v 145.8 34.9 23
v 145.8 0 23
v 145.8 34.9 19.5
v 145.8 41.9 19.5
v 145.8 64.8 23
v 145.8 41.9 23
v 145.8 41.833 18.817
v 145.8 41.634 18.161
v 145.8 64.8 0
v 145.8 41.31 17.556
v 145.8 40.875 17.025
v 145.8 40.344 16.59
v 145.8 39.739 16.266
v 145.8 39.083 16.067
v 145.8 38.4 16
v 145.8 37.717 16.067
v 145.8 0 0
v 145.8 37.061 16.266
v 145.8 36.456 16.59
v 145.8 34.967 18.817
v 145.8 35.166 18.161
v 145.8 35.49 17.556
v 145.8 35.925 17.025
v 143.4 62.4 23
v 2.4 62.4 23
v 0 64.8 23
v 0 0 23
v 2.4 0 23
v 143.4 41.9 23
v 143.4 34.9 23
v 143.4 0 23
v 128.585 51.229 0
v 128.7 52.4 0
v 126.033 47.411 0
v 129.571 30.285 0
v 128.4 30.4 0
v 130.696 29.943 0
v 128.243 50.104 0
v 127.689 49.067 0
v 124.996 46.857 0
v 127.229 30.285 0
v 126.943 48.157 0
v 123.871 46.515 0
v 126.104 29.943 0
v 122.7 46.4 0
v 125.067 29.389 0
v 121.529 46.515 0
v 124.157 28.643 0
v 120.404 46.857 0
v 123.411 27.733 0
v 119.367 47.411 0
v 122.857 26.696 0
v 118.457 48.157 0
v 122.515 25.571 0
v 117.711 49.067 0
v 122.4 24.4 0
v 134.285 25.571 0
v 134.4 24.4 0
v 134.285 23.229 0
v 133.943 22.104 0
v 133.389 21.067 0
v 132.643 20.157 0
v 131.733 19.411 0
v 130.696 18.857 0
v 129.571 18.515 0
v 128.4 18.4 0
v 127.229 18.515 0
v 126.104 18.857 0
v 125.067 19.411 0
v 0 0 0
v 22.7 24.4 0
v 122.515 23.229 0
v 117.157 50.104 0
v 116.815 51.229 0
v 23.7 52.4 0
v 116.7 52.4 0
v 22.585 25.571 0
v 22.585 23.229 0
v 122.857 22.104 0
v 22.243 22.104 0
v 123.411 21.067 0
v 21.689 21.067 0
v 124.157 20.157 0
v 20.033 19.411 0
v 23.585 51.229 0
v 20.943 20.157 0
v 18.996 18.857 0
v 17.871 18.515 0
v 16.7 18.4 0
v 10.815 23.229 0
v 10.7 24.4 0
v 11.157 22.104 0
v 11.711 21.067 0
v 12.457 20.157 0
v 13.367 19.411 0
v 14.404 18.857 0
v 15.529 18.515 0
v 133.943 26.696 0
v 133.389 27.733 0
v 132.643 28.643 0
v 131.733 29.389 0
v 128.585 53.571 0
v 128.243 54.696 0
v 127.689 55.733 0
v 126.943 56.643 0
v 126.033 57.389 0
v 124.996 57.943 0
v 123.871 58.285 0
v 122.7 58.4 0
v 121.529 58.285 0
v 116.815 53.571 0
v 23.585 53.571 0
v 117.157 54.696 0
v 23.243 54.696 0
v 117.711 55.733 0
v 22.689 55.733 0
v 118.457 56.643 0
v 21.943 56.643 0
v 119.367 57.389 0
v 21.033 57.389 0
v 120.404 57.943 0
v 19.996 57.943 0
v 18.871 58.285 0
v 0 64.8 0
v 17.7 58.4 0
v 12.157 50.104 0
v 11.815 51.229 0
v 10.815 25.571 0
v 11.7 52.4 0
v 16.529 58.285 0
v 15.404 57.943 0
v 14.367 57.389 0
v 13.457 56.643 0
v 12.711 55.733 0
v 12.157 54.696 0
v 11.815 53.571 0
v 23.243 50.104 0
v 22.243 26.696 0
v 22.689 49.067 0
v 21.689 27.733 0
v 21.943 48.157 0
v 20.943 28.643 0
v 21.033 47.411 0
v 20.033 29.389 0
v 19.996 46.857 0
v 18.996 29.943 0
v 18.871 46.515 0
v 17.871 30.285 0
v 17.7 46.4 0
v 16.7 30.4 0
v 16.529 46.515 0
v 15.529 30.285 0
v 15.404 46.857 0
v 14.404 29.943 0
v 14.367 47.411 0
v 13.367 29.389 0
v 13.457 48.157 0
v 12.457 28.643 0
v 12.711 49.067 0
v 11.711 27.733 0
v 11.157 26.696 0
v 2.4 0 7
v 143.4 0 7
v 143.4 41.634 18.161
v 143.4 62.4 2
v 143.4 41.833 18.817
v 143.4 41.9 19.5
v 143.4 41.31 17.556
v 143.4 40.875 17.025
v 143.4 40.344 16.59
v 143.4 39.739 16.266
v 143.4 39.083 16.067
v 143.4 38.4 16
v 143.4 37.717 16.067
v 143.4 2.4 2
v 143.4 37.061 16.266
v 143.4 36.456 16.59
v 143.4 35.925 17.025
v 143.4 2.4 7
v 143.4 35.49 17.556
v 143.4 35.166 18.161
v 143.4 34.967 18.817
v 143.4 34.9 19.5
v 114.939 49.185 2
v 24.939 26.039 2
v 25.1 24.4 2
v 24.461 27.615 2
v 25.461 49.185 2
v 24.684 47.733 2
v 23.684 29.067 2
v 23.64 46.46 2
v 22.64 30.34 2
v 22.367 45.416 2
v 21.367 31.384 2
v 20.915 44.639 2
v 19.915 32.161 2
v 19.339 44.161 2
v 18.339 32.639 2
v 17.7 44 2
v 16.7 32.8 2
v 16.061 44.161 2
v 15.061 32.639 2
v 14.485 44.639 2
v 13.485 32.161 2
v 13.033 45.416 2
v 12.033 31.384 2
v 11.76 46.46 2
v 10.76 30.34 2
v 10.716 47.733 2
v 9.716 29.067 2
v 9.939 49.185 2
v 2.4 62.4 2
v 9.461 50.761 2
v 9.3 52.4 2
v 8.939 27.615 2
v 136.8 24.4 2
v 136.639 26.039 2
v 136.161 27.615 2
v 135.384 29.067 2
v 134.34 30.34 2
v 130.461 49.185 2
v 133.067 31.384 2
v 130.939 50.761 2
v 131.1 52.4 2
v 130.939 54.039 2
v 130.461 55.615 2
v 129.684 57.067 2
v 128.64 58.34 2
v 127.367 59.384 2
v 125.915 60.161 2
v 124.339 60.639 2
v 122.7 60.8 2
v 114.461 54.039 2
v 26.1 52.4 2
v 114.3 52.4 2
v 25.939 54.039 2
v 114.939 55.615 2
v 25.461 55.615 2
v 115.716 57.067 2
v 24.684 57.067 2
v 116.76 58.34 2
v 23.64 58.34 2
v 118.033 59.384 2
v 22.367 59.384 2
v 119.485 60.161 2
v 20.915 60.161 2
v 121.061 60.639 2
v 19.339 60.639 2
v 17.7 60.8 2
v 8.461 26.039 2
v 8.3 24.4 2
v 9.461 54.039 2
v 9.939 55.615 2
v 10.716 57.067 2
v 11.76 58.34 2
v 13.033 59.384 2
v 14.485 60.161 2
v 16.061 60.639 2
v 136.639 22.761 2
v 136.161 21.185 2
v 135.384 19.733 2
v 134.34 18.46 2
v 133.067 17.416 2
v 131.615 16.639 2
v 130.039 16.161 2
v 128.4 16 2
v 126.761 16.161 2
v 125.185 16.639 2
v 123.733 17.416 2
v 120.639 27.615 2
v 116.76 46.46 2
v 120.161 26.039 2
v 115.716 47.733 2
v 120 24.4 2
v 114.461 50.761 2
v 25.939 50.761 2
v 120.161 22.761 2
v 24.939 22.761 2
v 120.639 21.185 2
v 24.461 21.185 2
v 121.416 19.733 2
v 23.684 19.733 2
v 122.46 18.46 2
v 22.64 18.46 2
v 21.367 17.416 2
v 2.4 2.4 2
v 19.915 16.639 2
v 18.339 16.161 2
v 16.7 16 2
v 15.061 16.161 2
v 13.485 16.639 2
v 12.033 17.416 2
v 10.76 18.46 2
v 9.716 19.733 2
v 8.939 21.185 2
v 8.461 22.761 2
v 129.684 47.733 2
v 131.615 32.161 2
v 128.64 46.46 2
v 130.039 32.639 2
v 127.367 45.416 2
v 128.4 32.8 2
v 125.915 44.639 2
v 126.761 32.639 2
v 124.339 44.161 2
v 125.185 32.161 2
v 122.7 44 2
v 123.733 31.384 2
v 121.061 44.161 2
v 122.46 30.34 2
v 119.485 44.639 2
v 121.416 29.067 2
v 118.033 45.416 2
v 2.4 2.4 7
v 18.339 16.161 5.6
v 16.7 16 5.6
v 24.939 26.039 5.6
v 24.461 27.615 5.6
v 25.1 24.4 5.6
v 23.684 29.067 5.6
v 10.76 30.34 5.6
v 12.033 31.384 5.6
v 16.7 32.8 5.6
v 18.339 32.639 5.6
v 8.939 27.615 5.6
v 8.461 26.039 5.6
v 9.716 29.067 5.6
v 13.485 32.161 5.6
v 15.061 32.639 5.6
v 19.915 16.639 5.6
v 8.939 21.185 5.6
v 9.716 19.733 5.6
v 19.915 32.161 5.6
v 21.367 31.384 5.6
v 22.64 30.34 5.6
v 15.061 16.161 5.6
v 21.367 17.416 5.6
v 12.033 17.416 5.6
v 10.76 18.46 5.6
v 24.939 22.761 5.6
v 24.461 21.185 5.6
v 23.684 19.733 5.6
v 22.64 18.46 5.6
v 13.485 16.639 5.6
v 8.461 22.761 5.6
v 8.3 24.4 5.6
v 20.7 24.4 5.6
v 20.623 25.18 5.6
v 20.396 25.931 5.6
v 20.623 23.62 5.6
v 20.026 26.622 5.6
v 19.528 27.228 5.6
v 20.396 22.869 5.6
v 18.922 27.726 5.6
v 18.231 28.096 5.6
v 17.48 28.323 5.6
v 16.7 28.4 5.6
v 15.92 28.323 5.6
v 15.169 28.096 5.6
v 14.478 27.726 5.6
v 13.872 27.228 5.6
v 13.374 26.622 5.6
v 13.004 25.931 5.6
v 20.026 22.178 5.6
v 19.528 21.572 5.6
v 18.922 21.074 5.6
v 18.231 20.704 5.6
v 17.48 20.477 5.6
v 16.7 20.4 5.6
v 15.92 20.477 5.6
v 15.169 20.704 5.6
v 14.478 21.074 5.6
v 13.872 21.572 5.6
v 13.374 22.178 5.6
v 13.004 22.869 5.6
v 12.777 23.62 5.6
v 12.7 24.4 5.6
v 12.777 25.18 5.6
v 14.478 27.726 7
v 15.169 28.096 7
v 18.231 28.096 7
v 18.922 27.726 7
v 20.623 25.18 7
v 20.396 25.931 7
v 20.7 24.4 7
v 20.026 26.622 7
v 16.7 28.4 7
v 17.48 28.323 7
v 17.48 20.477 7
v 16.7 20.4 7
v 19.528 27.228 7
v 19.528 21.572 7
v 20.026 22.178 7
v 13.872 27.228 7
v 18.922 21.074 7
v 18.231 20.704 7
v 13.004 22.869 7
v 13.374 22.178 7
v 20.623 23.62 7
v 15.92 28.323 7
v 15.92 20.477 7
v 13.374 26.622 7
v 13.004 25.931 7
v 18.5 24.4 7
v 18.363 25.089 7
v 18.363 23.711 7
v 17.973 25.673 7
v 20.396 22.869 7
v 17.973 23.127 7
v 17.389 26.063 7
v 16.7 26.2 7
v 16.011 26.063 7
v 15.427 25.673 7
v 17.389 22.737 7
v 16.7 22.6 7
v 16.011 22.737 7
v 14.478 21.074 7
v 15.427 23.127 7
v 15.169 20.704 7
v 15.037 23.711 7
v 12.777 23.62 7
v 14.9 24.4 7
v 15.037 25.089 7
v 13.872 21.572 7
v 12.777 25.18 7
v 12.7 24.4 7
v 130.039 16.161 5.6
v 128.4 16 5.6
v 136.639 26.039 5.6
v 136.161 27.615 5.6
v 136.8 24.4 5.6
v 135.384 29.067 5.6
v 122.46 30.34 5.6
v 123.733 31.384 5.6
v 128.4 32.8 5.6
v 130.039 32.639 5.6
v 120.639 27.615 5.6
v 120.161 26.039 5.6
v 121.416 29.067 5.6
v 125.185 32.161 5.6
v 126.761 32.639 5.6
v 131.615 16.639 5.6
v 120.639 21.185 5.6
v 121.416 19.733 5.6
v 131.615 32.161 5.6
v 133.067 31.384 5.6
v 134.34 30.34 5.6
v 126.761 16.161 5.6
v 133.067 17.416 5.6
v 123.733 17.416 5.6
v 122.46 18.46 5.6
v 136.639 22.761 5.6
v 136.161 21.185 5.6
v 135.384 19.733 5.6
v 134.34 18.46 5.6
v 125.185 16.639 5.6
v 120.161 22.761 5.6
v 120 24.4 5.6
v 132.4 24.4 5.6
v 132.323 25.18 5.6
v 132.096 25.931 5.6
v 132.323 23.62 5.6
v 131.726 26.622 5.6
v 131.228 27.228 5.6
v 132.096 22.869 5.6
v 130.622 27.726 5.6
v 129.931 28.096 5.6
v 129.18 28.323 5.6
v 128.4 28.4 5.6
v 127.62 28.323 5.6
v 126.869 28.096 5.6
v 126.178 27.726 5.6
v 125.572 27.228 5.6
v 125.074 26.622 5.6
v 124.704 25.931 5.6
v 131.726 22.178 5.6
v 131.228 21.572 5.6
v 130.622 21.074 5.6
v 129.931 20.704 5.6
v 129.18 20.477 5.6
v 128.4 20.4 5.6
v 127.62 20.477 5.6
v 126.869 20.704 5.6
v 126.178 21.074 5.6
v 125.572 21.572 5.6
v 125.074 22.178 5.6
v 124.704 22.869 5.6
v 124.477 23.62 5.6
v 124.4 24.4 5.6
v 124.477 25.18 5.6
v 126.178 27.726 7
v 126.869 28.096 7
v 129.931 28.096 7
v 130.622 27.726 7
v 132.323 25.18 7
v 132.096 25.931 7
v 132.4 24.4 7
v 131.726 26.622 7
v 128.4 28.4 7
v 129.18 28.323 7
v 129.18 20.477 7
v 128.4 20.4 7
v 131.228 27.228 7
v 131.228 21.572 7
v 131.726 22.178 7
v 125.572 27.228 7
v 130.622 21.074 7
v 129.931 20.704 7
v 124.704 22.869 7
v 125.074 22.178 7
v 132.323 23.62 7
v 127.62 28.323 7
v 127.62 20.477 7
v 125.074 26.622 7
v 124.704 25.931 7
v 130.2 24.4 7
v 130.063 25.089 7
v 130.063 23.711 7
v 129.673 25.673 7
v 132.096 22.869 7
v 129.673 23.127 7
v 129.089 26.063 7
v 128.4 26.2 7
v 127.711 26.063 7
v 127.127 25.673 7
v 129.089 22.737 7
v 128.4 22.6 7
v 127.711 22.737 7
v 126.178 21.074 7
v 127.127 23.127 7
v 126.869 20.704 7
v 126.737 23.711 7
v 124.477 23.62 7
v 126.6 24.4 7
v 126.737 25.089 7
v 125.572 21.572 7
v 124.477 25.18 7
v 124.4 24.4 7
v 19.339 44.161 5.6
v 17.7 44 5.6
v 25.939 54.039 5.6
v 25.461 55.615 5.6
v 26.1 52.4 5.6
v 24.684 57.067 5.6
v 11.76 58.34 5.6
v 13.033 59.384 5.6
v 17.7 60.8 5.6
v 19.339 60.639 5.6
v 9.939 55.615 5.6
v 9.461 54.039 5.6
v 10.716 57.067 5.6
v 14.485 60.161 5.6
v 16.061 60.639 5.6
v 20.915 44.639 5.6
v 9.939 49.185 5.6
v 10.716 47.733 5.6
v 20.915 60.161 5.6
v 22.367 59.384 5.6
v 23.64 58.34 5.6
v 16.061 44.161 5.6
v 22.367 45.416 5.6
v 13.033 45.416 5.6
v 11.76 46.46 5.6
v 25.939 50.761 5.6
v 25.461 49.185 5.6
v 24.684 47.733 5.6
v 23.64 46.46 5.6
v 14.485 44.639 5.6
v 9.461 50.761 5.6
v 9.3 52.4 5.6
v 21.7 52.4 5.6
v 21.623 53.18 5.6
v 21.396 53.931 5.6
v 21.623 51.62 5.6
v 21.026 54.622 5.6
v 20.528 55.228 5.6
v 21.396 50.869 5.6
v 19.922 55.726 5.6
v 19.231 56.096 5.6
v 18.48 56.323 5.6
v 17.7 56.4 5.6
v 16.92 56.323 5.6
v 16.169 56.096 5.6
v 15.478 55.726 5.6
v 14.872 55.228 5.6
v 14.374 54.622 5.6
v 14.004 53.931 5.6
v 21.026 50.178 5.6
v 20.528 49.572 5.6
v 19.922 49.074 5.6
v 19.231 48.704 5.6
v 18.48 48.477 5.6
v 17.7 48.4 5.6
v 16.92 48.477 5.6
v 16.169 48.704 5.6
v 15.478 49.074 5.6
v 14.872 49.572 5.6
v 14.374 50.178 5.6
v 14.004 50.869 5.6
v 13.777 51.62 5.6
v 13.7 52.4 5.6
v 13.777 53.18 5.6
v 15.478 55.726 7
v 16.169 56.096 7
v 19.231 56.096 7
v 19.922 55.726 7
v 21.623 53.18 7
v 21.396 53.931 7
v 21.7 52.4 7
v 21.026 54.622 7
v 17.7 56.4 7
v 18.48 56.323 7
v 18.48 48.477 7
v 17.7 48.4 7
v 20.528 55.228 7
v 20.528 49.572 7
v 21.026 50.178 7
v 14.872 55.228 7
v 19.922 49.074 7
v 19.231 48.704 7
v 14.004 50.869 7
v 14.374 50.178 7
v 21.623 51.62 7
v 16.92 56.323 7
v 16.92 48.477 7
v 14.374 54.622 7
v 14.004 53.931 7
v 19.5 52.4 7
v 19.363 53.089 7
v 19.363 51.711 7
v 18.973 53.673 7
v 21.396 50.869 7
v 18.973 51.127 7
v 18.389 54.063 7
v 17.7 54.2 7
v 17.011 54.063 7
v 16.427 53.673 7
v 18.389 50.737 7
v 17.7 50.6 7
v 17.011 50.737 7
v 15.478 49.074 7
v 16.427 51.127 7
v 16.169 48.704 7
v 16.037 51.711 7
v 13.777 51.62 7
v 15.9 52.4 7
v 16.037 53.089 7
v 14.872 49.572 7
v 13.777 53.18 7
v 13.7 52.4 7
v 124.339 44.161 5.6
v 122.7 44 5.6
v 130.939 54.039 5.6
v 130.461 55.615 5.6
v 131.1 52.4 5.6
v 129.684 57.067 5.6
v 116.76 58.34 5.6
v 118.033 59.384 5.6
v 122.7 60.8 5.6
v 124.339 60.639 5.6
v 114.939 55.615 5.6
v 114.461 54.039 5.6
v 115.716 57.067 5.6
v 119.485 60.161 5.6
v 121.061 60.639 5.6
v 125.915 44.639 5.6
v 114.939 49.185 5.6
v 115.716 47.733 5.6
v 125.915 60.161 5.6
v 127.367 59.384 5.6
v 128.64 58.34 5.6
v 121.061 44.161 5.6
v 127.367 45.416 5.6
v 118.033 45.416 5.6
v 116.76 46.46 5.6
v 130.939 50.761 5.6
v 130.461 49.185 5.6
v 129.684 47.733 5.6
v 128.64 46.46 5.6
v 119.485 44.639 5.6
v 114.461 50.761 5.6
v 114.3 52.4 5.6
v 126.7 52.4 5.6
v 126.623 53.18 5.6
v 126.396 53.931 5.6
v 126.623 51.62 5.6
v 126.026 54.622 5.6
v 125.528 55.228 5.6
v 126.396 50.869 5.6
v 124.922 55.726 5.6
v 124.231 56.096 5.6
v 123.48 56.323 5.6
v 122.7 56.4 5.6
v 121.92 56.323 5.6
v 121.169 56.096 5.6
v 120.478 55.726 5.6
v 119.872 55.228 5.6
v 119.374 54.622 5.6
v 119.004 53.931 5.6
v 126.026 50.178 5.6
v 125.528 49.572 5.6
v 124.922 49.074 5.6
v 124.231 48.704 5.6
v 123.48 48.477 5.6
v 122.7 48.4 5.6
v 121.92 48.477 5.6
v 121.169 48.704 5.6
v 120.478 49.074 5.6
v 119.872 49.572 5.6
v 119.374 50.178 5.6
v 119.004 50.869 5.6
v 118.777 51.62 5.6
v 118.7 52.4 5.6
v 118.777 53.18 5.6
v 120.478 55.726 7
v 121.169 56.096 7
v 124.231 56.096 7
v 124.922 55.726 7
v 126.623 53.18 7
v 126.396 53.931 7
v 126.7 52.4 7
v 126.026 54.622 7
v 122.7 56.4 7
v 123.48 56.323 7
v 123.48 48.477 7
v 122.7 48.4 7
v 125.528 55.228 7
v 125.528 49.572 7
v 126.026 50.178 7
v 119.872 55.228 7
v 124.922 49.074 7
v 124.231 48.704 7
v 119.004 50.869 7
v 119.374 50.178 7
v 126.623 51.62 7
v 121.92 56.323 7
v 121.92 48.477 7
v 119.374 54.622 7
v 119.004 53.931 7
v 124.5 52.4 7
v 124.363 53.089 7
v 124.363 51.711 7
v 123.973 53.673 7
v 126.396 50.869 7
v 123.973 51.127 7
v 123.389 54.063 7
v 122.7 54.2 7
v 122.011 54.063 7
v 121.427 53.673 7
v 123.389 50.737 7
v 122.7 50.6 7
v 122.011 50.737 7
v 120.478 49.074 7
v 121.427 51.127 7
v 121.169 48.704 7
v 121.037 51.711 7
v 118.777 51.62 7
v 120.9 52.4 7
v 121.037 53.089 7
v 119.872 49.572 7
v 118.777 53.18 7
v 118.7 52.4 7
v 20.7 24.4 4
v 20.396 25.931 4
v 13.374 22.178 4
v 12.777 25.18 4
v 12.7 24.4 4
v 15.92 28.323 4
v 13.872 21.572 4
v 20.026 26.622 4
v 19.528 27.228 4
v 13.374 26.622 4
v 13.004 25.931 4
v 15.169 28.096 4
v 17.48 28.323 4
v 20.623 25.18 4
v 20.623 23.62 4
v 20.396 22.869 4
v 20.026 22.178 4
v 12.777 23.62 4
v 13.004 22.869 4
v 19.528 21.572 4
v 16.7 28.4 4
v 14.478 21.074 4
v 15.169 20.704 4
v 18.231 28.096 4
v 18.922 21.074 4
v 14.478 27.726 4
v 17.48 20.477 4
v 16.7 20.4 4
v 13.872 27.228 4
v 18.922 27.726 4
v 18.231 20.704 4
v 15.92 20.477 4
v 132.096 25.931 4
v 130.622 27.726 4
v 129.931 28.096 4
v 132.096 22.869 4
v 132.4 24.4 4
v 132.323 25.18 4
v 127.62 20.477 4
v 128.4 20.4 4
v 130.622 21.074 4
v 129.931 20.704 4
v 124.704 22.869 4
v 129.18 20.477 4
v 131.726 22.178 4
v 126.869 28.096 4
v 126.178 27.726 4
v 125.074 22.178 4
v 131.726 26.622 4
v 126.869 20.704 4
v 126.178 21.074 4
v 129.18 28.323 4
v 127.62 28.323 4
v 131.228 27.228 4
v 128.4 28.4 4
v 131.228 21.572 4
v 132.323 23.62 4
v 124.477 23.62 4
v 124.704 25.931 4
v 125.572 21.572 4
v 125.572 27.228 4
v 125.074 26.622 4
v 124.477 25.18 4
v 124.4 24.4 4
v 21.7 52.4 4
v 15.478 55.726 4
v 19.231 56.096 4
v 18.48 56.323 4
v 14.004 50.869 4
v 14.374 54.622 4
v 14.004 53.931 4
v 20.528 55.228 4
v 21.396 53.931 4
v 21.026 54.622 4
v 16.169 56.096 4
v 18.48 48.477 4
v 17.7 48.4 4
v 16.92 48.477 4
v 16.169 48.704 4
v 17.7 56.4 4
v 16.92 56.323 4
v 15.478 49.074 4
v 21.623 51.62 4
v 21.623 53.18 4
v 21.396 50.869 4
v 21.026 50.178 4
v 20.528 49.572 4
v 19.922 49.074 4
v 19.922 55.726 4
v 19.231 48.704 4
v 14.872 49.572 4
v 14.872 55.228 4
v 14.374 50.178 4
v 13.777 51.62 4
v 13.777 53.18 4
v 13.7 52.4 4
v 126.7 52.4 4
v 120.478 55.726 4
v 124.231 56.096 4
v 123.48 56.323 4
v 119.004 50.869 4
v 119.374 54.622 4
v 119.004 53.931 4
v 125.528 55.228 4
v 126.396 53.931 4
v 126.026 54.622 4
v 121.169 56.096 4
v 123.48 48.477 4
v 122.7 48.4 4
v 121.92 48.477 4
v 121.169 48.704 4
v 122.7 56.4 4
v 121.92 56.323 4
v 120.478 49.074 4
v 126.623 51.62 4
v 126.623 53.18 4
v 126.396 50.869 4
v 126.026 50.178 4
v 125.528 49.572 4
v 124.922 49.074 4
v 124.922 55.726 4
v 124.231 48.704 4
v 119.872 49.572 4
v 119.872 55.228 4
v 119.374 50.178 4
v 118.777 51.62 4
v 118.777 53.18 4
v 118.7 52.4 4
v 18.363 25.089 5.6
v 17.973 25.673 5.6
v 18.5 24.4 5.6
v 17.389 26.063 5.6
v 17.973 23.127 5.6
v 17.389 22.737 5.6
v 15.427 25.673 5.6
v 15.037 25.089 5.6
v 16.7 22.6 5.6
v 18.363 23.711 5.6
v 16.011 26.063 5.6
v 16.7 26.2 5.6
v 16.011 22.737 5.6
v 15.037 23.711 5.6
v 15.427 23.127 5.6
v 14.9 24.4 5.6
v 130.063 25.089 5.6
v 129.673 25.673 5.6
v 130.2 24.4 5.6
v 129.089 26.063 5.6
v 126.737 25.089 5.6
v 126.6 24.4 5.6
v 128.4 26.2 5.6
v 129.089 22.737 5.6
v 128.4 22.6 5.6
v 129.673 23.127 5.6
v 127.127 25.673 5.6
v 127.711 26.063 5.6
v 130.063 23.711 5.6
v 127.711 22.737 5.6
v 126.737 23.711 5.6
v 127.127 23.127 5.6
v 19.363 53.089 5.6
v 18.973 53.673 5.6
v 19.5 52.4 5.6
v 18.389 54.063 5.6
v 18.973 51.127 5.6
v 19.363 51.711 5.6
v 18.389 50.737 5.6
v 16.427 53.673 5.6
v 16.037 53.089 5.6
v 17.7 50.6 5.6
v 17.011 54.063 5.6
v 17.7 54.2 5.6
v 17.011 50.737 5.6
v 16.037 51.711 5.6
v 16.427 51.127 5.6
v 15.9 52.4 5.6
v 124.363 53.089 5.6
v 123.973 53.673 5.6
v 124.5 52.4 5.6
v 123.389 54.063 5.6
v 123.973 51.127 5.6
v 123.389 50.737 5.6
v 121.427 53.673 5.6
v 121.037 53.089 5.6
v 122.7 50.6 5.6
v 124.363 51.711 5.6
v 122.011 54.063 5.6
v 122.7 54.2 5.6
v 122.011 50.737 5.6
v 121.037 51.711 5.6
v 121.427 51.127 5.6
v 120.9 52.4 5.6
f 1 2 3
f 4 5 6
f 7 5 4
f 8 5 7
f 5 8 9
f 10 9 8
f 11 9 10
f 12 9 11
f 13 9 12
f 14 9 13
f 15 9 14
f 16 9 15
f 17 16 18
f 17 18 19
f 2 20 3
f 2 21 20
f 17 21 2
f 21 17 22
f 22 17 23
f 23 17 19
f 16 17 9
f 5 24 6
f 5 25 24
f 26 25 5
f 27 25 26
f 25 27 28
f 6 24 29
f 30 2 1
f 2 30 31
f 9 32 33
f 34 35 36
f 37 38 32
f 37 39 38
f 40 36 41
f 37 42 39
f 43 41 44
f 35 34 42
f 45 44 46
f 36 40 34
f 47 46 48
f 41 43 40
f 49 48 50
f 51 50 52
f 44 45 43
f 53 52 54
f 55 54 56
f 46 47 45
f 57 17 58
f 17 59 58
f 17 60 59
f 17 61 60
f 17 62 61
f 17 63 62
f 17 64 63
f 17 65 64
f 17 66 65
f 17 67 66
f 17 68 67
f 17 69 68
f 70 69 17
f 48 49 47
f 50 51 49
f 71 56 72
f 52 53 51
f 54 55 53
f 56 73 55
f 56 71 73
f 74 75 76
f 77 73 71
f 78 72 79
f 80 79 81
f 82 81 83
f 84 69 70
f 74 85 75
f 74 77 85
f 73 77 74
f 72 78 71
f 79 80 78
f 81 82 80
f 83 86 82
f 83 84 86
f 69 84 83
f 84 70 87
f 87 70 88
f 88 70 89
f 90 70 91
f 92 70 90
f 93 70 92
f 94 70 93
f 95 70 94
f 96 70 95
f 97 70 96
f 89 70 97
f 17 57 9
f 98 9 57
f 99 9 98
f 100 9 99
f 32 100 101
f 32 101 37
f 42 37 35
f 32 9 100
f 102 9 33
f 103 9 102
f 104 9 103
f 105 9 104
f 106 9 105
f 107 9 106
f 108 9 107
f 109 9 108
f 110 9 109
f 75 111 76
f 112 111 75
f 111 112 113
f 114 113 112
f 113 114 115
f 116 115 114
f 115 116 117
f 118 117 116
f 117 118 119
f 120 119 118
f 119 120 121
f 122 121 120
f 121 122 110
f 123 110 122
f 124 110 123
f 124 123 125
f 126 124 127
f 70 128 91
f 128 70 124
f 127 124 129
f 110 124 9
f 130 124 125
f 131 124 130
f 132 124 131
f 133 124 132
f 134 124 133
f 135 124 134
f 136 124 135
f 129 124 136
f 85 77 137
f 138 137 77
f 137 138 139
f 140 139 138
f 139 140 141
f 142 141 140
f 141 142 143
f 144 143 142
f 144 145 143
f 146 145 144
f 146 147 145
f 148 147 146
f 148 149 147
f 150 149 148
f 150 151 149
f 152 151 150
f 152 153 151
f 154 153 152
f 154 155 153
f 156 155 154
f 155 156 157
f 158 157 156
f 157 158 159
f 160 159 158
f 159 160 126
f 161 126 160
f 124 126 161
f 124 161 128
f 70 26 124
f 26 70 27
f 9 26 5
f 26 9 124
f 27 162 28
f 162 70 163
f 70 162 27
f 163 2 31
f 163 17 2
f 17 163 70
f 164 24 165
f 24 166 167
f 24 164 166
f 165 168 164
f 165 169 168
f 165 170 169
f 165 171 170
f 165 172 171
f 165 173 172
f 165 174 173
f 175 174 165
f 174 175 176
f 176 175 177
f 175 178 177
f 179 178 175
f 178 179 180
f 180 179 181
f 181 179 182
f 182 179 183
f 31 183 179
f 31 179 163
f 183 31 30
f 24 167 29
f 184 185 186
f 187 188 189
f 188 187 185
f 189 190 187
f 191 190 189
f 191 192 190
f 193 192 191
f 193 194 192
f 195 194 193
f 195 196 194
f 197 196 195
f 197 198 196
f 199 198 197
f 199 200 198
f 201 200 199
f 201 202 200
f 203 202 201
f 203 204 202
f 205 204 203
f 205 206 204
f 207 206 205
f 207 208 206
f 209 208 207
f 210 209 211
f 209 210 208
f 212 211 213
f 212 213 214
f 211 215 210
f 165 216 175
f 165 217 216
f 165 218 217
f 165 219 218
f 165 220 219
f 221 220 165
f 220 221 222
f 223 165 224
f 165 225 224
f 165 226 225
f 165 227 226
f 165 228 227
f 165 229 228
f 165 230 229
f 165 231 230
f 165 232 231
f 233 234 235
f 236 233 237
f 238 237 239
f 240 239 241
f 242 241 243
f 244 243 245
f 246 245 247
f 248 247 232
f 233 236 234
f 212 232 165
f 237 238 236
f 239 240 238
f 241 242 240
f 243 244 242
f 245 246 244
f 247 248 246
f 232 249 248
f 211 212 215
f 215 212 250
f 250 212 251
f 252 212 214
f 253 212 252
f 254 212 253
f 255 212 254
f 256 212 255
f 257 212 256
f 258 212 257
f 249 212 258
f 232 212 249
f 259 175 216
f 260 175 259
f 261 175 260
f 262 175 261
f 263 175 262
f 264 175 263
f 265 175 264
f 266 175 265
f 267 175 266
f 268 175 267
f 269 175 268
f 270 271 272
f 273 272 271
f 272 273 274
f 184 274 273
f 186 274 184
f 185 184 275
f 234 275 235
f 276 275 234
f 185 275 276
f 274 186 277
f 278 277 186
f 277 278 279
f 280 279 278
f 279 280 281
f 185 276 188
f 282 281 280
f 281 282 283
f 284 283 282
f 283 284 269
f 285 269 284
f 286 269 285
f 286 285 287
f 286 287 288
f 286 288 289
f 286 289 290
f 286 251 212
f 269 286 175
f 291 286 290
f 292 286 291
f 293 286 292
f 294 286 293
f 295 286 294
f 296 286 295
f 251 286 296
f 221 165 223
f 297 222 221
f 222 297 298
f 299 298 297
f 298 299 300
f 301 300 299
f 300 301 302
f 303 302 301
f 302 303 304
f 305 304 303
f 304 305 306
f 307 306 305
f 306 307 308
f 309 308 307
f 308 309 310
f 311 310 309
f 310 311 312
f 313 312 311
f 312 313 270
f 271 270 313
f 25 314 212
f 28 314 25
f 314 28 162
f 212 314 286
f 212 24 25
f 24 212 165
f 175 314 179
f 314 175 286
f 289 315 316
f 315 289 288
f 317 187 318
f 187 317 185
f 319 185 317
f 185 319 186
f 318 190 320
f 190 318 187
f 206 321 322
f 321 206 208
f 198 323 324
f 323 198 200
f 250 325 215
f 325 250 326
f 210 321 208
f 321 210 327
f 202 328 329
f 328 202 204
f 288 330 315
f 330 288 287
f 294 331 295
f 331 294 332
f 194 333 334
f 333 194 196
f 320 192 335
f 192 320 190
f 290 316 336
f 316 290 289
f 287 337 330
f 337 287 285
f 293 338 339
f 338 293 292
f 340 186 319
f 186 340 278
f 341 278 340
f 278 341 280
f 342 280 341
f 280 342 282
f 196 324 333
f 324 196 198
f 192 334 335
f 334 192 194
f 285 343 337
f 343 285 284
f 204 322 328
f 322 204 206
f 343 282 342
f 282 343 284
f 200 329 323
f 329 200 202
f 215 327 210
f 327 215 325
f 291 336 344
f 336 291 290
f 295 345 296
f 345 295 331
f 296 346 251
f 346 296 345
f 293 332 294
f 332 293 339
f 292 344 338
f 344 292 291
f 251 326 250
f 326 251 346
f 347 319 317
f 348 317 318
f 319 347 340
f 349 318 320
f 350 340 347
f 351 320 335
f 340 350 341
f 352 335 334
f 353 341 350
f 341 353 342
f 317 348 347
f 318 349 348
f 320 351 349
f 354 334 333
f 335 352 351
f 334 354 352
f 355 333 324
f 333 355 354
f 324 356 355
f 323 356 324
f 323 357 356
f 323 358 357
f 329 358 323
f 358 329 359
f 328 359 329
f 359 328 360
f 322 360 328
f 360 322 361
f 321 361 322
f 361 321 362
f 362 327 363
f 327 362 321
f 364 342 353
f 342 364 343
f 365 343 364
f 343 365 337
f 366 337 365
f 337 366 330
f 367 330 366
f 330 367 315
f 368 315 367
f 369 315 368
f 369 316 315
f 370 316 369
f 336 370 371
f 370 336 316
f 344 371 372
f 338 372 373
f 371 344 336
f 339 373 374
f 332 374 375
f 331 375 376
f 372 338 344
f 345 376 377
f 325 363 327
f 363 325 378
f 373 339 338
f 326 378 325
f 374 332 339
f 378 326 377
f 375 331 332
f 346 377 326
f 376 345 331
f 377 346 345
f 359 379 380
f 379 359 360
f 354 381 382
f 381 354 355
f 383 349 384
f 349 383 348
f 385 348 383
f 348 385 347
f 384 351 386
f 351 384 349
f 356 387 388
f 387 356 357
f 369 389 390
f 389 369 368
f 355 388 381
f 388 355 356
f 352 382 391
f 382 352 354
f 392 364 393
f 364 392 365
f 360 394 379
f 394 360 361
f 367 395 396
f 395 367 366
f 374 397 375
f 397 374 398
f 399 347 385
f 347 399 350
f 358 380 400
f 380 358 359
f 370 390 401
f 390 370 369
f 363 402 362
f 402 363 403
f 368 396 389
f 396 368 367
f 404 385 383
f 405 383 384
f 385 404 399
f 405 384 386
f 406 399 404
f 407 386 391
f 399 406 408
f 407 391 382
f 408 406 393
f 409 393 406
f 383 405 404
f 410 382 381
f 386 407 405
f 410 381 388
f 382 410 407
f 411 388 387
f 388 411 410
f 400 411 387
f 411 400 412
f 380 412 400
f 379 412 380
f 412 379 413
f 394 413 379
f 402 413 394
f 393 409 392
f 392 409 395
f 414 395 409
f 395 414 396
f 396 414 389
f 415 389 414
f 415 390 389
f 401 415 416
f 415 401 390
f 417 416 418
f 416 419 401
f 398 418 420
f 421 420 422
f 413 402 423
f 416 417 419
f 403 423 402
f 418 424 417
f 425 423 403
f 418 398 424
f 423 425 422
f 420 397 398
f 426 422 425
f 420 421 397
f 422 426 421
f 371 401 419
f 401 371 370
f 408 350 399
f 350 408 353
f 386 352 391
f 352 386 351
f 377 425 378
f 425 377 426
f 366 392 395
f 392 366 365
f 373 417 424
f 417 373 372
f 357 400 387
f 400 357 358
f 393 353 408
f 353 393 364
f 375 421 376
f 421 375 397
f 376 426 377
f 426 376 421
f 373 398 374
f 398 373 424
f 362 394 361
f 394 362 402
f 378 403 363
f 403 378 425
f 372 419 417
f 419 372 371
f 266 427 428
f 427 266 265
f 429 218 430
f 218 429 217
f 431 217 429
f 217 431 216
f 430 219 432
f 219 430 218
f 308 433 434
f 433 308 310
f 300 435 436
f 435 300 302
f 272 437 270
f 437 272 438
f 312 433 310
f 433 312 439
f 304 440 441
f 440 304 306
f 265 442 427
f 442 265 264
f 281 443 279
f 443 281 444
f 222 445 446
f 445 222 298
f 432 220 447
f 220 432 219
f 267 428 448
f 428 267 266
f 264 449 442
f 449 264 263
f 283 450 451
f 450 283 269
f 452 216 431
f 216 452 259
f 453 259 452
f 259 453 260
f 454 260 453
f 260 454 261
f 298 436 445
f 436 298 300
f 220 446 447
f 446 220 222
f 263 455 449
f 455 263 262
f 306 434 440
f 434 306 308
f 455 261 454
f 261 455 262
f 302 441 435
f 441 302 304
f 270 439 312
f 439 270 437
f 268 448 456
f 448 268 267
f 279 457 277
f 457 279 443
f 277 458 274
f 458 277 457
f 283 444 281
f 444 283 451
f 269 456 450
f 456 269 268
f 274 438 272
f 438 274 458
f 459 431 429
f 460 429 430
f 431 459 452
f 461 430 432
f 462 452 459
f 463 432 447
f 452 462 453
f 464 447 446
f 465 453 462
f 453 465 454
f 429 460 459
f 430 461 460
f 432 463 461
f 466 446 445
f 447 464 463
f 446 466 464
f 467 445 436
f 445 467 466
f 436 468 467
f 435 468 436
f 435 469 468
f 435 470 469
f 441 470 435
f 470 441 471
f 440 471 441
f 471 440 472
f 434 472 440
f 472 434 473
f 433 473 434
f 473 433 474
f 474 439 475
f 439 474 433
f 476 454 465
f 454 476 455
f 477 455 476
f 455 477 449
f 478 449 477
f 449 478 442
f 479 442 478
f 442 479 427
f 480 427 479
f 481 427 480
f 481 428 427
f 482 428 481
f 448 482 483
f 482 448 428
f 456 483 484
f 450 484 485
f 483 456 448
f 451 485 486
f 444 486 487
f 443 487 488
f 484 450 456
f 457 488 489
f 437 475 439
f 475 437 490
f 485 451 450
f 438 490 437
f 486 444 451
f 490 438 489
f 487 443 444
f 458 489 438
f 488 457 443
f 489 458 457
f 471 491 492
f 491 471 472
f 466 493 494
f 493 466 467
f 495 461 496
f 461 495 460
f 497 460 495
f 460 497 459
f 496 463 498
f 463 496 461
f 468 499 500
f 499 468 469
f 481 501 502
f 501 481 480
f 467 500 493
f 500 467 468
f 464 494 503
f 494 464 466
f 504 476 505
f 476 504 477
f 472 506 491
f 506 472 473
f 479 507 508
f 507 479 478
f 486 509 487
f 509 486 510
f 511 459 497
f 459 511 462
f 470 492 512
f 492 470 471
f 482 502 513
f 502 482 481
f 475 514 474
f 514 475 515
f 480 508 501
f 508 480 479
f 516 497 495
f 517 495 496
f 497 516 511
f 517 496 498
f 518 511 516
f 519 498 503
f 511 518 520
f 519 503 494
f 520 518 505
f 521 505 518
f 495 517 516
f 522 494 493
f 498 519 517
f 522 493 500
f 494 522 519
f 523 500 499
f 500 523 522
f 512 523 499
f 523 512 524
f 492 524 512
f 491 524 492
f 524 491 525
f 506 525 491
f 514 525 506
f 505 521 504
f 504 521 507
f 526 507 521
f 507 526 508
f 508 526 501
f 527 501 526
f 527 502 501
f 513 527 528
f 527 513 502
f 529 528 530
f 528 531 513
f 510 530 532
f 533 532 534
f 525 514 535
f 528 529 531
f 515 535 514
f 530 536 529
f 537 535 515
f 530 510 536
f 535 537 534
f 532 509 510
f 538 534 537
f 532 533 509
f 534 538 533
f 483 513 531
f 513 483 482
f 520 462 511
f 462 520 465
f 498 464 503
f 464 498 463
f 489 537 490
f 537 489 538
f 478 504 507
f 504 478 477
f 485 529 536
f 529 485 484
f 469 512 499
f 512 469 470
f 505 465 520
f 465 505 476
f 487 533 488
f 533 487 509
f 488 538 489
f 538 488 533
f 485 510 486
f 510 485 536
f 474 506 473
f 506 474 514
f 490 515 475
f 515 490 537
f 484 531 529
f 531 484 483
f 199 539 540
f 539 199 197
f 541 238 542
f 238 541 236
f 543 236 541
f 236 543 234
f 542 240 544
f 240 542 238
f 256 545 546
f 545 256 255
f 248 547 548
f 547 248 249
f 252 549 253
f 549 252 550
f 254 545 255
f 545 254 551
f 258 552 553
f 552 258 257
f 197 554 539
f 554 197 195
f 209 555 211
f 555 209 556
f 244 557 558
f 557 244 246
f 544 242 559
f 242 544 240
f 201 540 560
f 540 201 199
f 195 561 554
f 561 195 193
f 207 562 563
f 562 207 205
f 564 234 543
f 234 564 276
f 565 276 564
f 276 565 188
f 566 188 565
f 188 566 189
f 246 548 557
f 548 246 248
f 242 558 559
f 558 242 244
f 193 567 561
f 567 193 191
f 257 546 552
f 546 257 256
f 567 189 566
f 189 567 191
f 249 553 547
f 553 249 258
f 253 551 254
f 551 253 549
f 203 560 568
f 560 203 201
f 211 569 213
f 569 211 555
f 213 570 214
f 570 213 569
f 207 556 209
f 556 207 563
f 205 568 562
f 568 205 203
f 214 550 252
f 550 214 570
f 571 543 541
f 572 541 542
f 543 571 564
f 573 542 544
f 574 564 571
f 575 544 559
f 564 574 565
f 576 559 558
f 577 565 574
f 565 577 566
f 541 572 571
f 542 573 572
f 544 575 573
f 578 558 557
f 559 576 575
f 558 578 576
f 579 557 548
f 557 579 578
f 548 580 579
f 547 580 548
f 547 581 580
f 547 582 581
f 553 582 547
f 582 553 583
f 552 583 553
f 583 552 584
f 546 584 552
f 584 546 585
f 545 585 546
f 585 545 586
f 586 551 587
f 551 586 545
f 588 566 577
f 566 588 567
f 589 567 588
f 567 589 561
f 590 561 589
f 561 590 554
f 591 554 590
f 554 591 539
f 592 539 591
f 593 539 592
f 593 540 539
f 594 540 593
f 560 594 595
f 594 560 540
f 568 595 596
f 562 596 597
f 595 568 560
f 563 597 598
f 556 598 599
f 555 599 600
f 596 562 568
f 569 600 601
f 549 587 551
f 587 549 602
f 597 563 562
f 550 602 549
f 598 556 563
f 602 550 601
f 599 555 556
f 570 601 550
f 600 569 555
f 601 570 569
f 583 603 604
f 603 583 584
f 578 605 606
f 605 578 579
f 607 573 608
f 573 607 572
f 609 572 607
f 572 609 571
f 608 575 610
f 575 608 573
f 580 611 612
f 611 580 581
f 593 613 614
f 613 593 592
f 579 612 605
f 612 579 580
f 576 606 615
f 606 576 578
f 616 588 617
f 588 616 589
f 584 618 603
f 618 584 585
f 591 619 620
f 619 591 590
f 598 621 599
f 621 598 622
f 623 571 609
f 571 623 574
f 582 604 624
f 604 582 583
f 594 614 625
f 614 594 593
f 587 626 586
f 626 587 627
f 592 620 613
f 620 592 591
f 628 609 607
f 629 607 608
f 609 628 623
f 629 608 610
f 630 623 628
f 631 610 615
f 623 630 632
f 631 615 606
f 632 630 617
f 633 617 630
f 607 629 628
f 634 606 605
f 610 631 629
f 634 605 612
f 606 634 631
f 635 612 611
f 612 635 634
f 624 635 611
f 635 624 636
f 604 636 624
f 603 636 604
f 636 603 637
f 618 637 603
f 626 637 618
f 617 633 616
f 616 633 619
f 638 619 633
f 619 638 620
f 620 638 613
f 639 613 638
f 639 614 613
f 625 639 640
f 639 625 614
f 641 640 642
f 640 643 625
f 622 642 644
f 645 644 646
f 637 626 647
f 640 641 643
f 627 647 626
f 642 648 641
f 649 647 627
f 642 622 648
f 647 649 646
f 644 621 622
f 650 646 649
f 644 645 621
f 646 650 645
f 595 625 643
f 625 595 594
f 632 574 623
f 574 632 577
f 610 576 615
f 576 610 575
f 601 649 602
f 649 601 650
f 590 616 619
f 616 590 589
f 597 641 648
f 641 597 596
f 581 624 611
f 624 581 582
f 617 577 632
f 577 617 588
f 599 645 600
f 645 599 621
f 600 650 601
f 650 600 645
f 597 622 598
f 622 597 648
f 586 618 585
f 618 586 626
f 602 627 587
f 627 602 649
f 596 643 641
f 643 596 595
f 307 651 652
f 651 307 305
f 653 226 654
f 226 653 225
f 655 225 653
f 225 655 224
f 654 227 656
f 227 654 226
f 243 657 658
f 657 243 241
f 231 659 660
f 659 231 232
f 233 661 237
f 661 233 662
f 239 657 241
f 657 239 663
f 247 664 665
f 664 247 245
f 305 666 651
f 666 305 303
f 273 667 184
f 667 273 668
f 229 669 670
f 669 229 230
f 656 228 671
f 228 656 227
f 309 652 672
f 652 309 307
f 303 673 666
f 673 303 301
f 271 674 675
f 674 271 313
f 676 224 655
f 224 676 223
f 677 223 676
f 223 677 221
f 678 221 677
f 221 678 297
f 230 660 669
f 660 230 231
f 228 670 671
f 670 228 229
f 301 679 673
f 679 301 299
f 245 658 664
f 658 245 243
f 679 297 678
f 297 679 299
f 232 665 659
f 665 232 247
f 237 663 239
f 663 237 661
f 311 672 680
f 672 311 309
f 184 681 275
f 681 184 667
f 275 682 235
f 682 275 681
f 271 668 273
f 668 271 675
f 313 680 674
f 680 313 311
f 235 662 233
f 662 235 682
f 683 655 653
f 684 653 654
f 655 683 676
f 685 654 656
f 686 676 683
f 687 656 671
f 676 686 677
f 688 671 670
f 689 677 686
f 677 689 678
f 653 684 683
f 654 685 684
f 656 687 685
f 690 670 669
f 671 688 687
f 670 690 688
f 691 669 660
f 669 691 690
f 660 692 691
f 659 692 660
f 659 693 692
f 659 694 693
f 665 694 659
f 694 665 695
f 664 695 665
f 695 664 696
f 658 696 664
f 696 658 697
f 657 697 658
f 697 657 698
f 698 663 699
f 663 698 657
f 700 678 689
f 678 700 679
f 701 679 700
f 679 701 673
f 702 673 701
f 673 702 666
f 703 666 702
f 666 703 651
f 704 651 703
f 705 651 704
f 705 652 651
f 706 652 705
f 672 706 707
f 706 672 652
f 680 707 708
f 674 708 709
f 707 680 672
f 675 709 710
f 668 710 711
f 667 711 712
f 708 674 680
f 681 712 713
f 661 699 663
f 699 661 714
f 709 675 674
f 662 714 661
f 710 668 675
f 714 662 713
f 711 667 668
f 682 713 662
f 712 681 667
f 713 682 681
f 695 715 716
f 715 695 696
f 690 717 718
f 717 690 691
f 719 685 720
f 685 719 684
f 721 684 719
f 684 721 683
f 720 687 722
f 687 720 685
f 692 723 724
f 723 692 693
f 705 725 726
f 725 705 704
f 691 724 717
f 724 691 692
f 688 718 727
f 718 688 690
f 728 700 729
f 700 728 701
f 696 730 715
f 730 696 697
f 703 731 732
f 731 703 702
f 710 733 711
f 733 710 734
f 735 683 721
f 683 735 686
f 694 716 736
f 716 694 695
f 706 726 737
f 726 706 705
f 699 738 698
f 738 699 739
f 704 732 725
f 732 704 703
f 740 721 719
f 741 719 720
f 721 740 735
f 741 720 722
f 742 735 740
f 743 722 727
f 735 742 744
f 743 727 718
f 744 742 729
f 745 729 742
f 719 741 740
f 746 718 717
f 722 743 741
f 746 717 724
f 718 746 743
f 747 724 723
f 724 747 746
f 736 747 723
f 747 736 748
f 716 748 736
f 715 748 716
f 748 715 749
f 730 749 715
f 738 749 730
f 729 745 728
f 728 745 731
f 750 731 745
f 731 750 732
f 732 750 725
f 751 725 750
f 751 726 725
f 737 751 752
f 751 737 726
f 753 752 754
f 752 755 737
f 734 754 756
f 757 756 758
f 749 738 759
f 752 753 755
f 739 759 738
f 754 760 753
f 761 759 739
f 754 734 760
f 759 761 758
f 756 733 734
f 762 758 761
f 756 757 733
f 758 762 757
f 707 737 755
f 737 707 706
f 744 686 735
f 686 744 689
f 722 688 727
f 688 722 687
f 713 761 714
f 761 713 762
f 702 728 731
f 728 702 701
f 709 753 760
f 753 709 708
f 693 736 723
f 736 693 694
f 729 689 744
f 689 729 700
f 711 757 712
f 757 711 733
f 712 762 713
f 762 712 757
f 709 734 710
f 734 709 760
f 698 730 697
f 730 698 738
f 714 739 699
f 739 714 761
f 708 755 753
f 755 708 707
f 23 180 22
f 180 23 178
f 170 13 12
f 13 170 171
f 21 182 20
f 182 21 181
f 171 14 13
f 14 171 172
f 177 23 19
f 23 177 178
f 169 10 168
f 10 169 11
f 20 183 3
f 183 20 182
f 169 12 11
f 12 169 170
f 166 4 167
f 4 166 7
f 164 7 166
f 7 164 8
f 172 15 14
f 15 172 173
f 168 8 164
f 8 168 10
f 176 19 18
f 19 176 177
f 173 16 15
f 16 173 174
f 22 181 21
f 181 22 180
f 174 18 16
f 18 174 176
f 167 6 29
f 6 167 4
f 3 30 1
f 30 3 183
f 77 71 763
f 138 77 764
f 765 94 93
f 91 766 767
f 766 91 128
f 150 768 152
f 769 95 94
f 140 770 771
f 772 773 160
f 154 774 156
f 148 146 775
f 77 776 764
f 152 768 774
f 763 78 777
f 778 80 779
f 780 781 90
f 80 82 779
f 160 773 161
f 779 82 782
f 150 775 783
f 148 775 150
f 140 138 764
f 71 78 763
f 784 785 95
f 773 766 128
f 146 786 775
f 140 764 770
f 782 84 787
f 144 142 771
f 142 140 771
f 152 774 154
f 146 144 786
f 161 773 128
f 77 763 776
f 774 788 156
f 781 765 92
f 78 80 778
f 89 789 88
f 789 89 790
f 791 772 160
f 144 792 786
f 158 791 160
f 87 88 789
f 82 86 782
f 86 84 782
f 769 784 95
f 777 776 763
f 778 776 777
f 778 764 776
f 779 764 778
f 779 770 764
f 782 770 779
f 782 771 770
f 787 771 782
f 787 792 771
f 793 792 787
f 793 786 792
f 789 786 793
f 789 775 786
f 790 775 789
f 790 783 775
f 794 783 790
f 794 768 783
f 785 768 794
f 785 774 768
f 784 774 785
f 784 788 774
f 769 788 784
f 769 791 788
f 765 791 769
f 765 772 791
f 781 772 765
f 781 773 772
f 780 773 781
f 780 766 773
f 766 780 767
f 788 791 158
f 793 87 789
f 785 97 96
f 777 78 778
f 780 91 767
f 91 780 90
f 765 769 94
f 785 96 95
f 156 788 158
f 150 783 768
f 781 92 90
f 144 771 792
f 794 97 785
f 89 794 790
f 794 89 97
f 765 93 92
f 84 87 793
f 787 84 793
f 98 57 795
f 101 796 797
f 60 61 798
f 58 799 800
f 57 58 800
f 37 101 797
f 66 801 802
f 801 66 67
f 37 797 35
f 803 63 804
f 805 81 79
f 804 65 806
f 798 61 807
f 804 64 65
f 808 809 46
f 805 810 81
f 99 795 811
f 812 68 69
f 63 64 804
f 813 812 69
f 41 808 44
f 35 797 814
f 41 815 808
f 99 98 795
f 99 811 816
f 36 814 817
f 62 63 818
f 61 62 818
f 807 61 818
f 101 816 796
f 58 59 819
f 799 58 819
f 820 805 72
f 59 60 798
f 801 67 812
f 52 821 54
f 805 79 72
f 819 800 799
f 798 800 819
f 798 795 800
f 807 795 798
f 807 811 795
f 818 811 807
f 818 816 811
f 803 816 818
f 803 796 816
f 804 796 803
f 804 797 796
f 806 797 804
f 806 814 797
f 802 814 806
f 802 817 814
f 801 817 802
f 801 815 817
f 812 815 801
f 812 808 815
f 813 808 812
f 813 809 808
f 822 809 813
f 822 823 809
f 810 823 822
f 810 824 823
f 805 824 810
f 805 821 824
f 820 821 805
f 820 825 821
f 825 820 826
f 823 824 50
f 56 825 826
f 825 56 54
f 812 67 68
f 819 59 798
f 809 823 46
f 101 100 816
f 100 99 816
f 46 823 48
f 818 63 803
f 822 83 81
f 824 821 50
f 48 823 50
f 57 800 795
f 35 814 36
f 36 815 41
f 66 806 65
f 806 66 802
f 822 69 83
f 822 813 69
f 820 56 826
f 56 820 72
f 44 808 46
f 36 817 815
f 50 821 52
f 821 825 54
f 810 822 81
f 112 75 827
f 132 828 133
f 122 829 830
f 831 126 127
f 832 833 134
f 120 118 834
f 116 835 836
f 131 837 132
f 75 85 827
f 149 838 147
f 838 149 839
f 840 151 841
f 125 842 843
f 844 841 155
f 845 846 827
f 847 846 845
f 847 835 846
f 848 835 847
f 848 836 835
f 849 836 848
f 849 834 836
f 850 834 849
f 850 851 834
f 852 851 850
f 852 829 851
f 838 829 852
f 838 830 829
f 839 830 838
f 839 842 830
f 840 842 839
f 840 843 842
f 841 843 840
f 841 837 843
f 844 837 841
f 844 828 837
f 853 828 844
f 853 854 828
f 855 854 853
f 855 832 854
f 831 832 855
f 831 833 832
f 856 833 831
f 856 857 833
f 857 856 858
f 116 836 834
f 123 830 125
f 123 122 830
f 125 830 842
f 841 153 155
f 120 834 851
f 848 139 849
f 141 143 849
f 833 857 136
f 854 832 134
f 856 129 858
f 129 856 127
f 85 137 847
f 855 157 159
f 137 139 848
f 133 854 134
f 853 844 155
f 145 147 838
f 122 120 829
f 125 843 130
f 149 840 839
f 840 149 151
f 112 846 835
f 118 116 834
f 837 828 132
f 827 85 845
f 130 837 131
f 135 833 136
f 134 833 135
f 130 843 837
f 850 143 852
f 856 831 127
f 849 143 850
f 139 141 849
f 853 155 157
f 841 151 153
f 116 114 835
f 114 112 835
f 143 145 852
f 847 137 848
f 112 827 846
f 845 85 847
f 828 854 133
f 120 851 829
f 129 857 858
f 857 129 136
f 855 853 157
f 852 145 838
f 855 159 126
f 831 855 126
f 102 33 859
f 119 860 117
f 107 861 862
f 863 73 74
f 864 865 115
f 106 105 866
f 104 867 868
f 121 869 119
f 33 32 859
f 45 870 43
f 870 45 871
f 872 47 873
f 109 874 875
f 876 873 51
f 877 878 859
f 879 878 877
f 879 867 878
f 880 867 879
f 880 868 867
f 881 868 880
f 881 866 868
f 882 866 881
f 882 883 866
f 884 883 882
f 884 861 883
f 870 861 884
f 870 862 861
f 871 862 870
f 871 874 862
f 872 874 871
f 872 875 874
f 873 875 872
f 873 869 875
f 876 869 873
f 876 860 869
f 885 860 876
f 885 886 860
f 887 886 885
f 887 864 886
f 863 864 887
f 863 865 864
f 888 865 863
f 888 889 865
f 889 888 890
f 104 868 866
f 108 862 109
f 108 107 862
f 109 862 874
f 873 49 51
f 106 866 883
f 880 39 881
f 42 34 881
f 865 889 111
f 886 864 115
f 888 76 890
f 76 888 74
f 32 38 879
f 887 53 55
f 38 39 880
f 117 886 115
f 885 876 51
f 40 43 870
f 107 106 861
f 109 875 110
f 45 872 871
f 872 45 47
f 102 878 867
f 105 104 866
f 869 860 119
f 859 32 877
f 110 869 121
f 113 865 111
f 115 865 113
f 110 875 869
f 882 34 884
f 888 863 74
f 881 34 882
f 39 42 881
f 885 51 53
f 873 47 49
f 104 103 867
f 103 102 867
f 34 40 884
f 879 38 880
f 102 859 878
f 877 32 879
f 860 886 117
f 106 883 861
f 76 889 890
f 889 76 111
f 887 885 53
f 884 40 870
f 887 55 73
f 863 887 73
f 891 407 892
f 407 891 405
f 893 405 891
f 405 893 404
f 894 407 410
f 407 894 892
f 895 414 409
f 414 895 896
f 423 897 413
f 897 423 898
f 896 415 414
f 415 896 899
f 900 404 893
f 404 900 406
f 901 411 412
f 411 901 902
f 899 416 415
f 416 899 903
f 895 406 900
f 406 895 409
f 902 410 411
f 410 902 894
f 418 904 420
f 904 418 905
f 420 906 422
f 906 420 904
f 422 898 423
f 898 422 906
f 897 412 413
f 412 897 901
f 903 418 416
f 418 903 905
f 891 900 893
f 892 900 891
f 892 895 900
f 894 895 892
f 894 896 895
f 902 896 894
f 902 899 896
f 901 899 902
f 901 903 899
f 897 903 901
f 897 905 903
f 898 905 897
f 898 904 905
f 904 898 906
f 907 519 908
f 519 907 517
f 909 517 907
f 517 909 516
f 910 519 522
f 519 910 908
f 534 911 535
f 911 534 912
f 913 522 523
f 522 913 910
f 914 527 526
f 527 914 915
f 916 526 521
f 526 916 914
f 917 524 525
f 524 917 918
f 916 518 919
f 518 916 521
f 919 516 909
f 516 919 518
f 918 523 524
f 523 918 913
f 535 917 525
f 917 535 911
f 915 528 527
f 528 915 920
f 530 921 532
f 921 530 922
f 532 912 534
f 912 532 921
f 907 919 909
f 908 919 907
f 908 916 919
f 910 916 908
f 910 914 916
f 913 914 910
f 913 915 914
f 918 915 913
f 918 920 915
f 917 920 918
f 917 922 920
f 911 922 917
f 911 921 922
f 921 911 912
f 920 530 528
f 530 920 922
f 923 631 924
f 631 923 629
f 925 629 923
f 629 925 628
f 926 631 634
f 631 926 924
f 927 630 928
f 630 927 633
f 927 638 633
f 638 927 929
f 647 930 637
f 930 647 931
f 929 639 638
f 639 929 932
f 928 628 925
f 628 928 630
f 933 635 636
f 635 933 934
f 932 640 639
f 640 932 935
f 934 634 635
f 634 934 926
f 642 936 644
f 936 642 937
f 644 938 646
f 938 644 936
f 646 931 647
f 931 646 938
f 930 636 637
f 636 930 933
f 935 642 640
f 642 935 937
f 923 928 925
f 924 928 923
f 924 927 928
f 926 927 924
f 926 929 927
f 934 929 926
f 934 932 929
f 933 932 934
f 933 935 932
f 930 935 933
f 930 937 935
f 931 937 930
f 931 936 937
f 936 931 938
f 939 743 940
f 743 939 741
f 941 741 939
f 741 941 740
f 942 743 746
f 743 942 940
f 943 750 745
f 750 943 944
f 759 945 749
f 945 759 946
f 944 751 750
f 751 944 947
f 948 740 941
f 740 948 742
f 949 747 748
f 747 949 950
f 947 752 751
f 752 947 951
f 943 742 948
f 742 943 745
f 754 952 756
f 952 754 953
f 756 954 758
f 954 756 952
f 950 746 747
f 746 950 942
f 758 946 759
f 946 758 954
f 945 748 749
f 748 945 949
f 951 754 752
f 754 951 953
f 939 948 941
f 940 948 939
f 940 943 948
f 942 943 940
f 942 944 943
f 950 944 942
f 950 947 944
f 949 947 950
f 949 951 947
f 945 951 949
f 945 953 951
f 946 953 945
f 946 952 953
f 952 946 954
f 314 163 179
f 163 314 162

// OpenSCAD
wallThickness=2.4;
baseThickness=2.0;

space=1;

wireHoleOffsetY=wallThickness+space+35;
wireDiameter=7;
wireRadius=wireDiameter/2;

screwM3Diameter=3.6;
screwHolderDiameter=8;
nutHoleSmallInnerDiameter=8;
nutHoleBigInnerDiameter=12;
nutHoleBigOuterDiameter=
	nutHoleBigInnerDiameter+2*wallThickness;

pcbSpaceHeight=16;
screwHolderHeight=1.4;
nutBaseHeight=1.6;
nutSpaceHeight=4;
nutHolderTotalHeight=screwHolderHeight+
	nutBaseHeight+nutSpaceHeight;

innerLength=139+2*space;
innerWidth=58+2*space;
totalLength=innerLength+2*wallThickness;
totalWidth=innerWidth+2*wallThickness;

totalHeight=pcbSpaceHeight+nutHolderTotalHeight;
innerHeight=totalHeight-baseThickness;

hole1OffsetX=wallThickness+space+13.3;
hole2OffsetX=wallThickness+space+125;
hole12OffsetY=wallThickness+space+21;

hole3OffsetX=wallThickness+space+14.3;
hole4OffsetX=wallThickness+space+119.3;
hole34OffsetY=wallThickness+space+49;

holderFn=32;
screwFn=16;

module mainBox()
{
	difference()
	{
		cube([totalLength,totalWidth,totalHeight]);
		
		translate([wallThickness,wallThickness,baseThickness])
		cube([innerLength,innerWidth,innerHeight+1]);
		
	}
}

module makeForEveryScrew()
{
	for(t=[[hole1OffsetX,hole12OffsetY],[hole2OffsetX,hole12OffsetY],
		[hole3OffsetX,hole34OffsetY],[hole4OffsetX,hole34OffsetY]])
	{
		translate([t[0],t[1],0])
		children();
	}
}

module nutHolder()
{
	cylinder(
		d=nutHoleBigOuterDiameter,
		//d2=nutHoleSmallOuterDiameter,
		h=nutSpaceHeight,
		$fn=holderFn
	);
	
	translate([0,0,nutSpaceHeight])
	cylinder(
		d=nutHoleBigOuterDiameter,
		h=nutBaseHeight,
		$fn=holderFn
	);
	
	translate([0,0,nutSpaceHeight+nutBaseHeight])
	cylinder(
		d=screwHolderDiameter,
		h=screwHolderHeight,
		$fn=holderFn
	);
}

module nutHole()
{
	cylinder(
		d1=nutHoleBigInnerDiameter,
		d2=nutHoleSmallInnerDiameter,
		h=nutSpaceHeight,
		$fn=holderFn
	);
}

module screwHole()
{
	//We must use drill to whole screw hole
	//We need print bridges above nut space
	translate([0,0,nutSpaceHeight+nutBaseHeight])
	cylinder(
		d=screwM3Diameter,
		h=screwHolderHeight+1,
		$fn=screwFn
	);
}

module wireHole()
{
	translate([totalLength-wallThickness-1,
		wireHoleOffsetY,totalHeight-wireRadius])
	{
		rotate([0,90,0])
		cylinder(d=wireDiameter,h=wallThickness+20,$fn=holderFn);
		
		translate([0,-wireRadius,0])
		cube([wallThickness+2,wireDiameter,wireRadius]);
	}
}

module plugsHole()
{
	translate([wallThickness,-1,totalHeight-pcbSpaceHeight])
	cube([innerLength,wallThickness+2,pcbSpaceHeight+1]);
}

difference()
{
	union()
	{
		mainBox();
		
		makeForEveryScrew()
		nutHolder();
	}
	
	wireHole();
	
	plugsHole();
	
	makeForEveryScrew()
	nutHole();
	
	makeForEveryScrew()
	screwHole();
}
